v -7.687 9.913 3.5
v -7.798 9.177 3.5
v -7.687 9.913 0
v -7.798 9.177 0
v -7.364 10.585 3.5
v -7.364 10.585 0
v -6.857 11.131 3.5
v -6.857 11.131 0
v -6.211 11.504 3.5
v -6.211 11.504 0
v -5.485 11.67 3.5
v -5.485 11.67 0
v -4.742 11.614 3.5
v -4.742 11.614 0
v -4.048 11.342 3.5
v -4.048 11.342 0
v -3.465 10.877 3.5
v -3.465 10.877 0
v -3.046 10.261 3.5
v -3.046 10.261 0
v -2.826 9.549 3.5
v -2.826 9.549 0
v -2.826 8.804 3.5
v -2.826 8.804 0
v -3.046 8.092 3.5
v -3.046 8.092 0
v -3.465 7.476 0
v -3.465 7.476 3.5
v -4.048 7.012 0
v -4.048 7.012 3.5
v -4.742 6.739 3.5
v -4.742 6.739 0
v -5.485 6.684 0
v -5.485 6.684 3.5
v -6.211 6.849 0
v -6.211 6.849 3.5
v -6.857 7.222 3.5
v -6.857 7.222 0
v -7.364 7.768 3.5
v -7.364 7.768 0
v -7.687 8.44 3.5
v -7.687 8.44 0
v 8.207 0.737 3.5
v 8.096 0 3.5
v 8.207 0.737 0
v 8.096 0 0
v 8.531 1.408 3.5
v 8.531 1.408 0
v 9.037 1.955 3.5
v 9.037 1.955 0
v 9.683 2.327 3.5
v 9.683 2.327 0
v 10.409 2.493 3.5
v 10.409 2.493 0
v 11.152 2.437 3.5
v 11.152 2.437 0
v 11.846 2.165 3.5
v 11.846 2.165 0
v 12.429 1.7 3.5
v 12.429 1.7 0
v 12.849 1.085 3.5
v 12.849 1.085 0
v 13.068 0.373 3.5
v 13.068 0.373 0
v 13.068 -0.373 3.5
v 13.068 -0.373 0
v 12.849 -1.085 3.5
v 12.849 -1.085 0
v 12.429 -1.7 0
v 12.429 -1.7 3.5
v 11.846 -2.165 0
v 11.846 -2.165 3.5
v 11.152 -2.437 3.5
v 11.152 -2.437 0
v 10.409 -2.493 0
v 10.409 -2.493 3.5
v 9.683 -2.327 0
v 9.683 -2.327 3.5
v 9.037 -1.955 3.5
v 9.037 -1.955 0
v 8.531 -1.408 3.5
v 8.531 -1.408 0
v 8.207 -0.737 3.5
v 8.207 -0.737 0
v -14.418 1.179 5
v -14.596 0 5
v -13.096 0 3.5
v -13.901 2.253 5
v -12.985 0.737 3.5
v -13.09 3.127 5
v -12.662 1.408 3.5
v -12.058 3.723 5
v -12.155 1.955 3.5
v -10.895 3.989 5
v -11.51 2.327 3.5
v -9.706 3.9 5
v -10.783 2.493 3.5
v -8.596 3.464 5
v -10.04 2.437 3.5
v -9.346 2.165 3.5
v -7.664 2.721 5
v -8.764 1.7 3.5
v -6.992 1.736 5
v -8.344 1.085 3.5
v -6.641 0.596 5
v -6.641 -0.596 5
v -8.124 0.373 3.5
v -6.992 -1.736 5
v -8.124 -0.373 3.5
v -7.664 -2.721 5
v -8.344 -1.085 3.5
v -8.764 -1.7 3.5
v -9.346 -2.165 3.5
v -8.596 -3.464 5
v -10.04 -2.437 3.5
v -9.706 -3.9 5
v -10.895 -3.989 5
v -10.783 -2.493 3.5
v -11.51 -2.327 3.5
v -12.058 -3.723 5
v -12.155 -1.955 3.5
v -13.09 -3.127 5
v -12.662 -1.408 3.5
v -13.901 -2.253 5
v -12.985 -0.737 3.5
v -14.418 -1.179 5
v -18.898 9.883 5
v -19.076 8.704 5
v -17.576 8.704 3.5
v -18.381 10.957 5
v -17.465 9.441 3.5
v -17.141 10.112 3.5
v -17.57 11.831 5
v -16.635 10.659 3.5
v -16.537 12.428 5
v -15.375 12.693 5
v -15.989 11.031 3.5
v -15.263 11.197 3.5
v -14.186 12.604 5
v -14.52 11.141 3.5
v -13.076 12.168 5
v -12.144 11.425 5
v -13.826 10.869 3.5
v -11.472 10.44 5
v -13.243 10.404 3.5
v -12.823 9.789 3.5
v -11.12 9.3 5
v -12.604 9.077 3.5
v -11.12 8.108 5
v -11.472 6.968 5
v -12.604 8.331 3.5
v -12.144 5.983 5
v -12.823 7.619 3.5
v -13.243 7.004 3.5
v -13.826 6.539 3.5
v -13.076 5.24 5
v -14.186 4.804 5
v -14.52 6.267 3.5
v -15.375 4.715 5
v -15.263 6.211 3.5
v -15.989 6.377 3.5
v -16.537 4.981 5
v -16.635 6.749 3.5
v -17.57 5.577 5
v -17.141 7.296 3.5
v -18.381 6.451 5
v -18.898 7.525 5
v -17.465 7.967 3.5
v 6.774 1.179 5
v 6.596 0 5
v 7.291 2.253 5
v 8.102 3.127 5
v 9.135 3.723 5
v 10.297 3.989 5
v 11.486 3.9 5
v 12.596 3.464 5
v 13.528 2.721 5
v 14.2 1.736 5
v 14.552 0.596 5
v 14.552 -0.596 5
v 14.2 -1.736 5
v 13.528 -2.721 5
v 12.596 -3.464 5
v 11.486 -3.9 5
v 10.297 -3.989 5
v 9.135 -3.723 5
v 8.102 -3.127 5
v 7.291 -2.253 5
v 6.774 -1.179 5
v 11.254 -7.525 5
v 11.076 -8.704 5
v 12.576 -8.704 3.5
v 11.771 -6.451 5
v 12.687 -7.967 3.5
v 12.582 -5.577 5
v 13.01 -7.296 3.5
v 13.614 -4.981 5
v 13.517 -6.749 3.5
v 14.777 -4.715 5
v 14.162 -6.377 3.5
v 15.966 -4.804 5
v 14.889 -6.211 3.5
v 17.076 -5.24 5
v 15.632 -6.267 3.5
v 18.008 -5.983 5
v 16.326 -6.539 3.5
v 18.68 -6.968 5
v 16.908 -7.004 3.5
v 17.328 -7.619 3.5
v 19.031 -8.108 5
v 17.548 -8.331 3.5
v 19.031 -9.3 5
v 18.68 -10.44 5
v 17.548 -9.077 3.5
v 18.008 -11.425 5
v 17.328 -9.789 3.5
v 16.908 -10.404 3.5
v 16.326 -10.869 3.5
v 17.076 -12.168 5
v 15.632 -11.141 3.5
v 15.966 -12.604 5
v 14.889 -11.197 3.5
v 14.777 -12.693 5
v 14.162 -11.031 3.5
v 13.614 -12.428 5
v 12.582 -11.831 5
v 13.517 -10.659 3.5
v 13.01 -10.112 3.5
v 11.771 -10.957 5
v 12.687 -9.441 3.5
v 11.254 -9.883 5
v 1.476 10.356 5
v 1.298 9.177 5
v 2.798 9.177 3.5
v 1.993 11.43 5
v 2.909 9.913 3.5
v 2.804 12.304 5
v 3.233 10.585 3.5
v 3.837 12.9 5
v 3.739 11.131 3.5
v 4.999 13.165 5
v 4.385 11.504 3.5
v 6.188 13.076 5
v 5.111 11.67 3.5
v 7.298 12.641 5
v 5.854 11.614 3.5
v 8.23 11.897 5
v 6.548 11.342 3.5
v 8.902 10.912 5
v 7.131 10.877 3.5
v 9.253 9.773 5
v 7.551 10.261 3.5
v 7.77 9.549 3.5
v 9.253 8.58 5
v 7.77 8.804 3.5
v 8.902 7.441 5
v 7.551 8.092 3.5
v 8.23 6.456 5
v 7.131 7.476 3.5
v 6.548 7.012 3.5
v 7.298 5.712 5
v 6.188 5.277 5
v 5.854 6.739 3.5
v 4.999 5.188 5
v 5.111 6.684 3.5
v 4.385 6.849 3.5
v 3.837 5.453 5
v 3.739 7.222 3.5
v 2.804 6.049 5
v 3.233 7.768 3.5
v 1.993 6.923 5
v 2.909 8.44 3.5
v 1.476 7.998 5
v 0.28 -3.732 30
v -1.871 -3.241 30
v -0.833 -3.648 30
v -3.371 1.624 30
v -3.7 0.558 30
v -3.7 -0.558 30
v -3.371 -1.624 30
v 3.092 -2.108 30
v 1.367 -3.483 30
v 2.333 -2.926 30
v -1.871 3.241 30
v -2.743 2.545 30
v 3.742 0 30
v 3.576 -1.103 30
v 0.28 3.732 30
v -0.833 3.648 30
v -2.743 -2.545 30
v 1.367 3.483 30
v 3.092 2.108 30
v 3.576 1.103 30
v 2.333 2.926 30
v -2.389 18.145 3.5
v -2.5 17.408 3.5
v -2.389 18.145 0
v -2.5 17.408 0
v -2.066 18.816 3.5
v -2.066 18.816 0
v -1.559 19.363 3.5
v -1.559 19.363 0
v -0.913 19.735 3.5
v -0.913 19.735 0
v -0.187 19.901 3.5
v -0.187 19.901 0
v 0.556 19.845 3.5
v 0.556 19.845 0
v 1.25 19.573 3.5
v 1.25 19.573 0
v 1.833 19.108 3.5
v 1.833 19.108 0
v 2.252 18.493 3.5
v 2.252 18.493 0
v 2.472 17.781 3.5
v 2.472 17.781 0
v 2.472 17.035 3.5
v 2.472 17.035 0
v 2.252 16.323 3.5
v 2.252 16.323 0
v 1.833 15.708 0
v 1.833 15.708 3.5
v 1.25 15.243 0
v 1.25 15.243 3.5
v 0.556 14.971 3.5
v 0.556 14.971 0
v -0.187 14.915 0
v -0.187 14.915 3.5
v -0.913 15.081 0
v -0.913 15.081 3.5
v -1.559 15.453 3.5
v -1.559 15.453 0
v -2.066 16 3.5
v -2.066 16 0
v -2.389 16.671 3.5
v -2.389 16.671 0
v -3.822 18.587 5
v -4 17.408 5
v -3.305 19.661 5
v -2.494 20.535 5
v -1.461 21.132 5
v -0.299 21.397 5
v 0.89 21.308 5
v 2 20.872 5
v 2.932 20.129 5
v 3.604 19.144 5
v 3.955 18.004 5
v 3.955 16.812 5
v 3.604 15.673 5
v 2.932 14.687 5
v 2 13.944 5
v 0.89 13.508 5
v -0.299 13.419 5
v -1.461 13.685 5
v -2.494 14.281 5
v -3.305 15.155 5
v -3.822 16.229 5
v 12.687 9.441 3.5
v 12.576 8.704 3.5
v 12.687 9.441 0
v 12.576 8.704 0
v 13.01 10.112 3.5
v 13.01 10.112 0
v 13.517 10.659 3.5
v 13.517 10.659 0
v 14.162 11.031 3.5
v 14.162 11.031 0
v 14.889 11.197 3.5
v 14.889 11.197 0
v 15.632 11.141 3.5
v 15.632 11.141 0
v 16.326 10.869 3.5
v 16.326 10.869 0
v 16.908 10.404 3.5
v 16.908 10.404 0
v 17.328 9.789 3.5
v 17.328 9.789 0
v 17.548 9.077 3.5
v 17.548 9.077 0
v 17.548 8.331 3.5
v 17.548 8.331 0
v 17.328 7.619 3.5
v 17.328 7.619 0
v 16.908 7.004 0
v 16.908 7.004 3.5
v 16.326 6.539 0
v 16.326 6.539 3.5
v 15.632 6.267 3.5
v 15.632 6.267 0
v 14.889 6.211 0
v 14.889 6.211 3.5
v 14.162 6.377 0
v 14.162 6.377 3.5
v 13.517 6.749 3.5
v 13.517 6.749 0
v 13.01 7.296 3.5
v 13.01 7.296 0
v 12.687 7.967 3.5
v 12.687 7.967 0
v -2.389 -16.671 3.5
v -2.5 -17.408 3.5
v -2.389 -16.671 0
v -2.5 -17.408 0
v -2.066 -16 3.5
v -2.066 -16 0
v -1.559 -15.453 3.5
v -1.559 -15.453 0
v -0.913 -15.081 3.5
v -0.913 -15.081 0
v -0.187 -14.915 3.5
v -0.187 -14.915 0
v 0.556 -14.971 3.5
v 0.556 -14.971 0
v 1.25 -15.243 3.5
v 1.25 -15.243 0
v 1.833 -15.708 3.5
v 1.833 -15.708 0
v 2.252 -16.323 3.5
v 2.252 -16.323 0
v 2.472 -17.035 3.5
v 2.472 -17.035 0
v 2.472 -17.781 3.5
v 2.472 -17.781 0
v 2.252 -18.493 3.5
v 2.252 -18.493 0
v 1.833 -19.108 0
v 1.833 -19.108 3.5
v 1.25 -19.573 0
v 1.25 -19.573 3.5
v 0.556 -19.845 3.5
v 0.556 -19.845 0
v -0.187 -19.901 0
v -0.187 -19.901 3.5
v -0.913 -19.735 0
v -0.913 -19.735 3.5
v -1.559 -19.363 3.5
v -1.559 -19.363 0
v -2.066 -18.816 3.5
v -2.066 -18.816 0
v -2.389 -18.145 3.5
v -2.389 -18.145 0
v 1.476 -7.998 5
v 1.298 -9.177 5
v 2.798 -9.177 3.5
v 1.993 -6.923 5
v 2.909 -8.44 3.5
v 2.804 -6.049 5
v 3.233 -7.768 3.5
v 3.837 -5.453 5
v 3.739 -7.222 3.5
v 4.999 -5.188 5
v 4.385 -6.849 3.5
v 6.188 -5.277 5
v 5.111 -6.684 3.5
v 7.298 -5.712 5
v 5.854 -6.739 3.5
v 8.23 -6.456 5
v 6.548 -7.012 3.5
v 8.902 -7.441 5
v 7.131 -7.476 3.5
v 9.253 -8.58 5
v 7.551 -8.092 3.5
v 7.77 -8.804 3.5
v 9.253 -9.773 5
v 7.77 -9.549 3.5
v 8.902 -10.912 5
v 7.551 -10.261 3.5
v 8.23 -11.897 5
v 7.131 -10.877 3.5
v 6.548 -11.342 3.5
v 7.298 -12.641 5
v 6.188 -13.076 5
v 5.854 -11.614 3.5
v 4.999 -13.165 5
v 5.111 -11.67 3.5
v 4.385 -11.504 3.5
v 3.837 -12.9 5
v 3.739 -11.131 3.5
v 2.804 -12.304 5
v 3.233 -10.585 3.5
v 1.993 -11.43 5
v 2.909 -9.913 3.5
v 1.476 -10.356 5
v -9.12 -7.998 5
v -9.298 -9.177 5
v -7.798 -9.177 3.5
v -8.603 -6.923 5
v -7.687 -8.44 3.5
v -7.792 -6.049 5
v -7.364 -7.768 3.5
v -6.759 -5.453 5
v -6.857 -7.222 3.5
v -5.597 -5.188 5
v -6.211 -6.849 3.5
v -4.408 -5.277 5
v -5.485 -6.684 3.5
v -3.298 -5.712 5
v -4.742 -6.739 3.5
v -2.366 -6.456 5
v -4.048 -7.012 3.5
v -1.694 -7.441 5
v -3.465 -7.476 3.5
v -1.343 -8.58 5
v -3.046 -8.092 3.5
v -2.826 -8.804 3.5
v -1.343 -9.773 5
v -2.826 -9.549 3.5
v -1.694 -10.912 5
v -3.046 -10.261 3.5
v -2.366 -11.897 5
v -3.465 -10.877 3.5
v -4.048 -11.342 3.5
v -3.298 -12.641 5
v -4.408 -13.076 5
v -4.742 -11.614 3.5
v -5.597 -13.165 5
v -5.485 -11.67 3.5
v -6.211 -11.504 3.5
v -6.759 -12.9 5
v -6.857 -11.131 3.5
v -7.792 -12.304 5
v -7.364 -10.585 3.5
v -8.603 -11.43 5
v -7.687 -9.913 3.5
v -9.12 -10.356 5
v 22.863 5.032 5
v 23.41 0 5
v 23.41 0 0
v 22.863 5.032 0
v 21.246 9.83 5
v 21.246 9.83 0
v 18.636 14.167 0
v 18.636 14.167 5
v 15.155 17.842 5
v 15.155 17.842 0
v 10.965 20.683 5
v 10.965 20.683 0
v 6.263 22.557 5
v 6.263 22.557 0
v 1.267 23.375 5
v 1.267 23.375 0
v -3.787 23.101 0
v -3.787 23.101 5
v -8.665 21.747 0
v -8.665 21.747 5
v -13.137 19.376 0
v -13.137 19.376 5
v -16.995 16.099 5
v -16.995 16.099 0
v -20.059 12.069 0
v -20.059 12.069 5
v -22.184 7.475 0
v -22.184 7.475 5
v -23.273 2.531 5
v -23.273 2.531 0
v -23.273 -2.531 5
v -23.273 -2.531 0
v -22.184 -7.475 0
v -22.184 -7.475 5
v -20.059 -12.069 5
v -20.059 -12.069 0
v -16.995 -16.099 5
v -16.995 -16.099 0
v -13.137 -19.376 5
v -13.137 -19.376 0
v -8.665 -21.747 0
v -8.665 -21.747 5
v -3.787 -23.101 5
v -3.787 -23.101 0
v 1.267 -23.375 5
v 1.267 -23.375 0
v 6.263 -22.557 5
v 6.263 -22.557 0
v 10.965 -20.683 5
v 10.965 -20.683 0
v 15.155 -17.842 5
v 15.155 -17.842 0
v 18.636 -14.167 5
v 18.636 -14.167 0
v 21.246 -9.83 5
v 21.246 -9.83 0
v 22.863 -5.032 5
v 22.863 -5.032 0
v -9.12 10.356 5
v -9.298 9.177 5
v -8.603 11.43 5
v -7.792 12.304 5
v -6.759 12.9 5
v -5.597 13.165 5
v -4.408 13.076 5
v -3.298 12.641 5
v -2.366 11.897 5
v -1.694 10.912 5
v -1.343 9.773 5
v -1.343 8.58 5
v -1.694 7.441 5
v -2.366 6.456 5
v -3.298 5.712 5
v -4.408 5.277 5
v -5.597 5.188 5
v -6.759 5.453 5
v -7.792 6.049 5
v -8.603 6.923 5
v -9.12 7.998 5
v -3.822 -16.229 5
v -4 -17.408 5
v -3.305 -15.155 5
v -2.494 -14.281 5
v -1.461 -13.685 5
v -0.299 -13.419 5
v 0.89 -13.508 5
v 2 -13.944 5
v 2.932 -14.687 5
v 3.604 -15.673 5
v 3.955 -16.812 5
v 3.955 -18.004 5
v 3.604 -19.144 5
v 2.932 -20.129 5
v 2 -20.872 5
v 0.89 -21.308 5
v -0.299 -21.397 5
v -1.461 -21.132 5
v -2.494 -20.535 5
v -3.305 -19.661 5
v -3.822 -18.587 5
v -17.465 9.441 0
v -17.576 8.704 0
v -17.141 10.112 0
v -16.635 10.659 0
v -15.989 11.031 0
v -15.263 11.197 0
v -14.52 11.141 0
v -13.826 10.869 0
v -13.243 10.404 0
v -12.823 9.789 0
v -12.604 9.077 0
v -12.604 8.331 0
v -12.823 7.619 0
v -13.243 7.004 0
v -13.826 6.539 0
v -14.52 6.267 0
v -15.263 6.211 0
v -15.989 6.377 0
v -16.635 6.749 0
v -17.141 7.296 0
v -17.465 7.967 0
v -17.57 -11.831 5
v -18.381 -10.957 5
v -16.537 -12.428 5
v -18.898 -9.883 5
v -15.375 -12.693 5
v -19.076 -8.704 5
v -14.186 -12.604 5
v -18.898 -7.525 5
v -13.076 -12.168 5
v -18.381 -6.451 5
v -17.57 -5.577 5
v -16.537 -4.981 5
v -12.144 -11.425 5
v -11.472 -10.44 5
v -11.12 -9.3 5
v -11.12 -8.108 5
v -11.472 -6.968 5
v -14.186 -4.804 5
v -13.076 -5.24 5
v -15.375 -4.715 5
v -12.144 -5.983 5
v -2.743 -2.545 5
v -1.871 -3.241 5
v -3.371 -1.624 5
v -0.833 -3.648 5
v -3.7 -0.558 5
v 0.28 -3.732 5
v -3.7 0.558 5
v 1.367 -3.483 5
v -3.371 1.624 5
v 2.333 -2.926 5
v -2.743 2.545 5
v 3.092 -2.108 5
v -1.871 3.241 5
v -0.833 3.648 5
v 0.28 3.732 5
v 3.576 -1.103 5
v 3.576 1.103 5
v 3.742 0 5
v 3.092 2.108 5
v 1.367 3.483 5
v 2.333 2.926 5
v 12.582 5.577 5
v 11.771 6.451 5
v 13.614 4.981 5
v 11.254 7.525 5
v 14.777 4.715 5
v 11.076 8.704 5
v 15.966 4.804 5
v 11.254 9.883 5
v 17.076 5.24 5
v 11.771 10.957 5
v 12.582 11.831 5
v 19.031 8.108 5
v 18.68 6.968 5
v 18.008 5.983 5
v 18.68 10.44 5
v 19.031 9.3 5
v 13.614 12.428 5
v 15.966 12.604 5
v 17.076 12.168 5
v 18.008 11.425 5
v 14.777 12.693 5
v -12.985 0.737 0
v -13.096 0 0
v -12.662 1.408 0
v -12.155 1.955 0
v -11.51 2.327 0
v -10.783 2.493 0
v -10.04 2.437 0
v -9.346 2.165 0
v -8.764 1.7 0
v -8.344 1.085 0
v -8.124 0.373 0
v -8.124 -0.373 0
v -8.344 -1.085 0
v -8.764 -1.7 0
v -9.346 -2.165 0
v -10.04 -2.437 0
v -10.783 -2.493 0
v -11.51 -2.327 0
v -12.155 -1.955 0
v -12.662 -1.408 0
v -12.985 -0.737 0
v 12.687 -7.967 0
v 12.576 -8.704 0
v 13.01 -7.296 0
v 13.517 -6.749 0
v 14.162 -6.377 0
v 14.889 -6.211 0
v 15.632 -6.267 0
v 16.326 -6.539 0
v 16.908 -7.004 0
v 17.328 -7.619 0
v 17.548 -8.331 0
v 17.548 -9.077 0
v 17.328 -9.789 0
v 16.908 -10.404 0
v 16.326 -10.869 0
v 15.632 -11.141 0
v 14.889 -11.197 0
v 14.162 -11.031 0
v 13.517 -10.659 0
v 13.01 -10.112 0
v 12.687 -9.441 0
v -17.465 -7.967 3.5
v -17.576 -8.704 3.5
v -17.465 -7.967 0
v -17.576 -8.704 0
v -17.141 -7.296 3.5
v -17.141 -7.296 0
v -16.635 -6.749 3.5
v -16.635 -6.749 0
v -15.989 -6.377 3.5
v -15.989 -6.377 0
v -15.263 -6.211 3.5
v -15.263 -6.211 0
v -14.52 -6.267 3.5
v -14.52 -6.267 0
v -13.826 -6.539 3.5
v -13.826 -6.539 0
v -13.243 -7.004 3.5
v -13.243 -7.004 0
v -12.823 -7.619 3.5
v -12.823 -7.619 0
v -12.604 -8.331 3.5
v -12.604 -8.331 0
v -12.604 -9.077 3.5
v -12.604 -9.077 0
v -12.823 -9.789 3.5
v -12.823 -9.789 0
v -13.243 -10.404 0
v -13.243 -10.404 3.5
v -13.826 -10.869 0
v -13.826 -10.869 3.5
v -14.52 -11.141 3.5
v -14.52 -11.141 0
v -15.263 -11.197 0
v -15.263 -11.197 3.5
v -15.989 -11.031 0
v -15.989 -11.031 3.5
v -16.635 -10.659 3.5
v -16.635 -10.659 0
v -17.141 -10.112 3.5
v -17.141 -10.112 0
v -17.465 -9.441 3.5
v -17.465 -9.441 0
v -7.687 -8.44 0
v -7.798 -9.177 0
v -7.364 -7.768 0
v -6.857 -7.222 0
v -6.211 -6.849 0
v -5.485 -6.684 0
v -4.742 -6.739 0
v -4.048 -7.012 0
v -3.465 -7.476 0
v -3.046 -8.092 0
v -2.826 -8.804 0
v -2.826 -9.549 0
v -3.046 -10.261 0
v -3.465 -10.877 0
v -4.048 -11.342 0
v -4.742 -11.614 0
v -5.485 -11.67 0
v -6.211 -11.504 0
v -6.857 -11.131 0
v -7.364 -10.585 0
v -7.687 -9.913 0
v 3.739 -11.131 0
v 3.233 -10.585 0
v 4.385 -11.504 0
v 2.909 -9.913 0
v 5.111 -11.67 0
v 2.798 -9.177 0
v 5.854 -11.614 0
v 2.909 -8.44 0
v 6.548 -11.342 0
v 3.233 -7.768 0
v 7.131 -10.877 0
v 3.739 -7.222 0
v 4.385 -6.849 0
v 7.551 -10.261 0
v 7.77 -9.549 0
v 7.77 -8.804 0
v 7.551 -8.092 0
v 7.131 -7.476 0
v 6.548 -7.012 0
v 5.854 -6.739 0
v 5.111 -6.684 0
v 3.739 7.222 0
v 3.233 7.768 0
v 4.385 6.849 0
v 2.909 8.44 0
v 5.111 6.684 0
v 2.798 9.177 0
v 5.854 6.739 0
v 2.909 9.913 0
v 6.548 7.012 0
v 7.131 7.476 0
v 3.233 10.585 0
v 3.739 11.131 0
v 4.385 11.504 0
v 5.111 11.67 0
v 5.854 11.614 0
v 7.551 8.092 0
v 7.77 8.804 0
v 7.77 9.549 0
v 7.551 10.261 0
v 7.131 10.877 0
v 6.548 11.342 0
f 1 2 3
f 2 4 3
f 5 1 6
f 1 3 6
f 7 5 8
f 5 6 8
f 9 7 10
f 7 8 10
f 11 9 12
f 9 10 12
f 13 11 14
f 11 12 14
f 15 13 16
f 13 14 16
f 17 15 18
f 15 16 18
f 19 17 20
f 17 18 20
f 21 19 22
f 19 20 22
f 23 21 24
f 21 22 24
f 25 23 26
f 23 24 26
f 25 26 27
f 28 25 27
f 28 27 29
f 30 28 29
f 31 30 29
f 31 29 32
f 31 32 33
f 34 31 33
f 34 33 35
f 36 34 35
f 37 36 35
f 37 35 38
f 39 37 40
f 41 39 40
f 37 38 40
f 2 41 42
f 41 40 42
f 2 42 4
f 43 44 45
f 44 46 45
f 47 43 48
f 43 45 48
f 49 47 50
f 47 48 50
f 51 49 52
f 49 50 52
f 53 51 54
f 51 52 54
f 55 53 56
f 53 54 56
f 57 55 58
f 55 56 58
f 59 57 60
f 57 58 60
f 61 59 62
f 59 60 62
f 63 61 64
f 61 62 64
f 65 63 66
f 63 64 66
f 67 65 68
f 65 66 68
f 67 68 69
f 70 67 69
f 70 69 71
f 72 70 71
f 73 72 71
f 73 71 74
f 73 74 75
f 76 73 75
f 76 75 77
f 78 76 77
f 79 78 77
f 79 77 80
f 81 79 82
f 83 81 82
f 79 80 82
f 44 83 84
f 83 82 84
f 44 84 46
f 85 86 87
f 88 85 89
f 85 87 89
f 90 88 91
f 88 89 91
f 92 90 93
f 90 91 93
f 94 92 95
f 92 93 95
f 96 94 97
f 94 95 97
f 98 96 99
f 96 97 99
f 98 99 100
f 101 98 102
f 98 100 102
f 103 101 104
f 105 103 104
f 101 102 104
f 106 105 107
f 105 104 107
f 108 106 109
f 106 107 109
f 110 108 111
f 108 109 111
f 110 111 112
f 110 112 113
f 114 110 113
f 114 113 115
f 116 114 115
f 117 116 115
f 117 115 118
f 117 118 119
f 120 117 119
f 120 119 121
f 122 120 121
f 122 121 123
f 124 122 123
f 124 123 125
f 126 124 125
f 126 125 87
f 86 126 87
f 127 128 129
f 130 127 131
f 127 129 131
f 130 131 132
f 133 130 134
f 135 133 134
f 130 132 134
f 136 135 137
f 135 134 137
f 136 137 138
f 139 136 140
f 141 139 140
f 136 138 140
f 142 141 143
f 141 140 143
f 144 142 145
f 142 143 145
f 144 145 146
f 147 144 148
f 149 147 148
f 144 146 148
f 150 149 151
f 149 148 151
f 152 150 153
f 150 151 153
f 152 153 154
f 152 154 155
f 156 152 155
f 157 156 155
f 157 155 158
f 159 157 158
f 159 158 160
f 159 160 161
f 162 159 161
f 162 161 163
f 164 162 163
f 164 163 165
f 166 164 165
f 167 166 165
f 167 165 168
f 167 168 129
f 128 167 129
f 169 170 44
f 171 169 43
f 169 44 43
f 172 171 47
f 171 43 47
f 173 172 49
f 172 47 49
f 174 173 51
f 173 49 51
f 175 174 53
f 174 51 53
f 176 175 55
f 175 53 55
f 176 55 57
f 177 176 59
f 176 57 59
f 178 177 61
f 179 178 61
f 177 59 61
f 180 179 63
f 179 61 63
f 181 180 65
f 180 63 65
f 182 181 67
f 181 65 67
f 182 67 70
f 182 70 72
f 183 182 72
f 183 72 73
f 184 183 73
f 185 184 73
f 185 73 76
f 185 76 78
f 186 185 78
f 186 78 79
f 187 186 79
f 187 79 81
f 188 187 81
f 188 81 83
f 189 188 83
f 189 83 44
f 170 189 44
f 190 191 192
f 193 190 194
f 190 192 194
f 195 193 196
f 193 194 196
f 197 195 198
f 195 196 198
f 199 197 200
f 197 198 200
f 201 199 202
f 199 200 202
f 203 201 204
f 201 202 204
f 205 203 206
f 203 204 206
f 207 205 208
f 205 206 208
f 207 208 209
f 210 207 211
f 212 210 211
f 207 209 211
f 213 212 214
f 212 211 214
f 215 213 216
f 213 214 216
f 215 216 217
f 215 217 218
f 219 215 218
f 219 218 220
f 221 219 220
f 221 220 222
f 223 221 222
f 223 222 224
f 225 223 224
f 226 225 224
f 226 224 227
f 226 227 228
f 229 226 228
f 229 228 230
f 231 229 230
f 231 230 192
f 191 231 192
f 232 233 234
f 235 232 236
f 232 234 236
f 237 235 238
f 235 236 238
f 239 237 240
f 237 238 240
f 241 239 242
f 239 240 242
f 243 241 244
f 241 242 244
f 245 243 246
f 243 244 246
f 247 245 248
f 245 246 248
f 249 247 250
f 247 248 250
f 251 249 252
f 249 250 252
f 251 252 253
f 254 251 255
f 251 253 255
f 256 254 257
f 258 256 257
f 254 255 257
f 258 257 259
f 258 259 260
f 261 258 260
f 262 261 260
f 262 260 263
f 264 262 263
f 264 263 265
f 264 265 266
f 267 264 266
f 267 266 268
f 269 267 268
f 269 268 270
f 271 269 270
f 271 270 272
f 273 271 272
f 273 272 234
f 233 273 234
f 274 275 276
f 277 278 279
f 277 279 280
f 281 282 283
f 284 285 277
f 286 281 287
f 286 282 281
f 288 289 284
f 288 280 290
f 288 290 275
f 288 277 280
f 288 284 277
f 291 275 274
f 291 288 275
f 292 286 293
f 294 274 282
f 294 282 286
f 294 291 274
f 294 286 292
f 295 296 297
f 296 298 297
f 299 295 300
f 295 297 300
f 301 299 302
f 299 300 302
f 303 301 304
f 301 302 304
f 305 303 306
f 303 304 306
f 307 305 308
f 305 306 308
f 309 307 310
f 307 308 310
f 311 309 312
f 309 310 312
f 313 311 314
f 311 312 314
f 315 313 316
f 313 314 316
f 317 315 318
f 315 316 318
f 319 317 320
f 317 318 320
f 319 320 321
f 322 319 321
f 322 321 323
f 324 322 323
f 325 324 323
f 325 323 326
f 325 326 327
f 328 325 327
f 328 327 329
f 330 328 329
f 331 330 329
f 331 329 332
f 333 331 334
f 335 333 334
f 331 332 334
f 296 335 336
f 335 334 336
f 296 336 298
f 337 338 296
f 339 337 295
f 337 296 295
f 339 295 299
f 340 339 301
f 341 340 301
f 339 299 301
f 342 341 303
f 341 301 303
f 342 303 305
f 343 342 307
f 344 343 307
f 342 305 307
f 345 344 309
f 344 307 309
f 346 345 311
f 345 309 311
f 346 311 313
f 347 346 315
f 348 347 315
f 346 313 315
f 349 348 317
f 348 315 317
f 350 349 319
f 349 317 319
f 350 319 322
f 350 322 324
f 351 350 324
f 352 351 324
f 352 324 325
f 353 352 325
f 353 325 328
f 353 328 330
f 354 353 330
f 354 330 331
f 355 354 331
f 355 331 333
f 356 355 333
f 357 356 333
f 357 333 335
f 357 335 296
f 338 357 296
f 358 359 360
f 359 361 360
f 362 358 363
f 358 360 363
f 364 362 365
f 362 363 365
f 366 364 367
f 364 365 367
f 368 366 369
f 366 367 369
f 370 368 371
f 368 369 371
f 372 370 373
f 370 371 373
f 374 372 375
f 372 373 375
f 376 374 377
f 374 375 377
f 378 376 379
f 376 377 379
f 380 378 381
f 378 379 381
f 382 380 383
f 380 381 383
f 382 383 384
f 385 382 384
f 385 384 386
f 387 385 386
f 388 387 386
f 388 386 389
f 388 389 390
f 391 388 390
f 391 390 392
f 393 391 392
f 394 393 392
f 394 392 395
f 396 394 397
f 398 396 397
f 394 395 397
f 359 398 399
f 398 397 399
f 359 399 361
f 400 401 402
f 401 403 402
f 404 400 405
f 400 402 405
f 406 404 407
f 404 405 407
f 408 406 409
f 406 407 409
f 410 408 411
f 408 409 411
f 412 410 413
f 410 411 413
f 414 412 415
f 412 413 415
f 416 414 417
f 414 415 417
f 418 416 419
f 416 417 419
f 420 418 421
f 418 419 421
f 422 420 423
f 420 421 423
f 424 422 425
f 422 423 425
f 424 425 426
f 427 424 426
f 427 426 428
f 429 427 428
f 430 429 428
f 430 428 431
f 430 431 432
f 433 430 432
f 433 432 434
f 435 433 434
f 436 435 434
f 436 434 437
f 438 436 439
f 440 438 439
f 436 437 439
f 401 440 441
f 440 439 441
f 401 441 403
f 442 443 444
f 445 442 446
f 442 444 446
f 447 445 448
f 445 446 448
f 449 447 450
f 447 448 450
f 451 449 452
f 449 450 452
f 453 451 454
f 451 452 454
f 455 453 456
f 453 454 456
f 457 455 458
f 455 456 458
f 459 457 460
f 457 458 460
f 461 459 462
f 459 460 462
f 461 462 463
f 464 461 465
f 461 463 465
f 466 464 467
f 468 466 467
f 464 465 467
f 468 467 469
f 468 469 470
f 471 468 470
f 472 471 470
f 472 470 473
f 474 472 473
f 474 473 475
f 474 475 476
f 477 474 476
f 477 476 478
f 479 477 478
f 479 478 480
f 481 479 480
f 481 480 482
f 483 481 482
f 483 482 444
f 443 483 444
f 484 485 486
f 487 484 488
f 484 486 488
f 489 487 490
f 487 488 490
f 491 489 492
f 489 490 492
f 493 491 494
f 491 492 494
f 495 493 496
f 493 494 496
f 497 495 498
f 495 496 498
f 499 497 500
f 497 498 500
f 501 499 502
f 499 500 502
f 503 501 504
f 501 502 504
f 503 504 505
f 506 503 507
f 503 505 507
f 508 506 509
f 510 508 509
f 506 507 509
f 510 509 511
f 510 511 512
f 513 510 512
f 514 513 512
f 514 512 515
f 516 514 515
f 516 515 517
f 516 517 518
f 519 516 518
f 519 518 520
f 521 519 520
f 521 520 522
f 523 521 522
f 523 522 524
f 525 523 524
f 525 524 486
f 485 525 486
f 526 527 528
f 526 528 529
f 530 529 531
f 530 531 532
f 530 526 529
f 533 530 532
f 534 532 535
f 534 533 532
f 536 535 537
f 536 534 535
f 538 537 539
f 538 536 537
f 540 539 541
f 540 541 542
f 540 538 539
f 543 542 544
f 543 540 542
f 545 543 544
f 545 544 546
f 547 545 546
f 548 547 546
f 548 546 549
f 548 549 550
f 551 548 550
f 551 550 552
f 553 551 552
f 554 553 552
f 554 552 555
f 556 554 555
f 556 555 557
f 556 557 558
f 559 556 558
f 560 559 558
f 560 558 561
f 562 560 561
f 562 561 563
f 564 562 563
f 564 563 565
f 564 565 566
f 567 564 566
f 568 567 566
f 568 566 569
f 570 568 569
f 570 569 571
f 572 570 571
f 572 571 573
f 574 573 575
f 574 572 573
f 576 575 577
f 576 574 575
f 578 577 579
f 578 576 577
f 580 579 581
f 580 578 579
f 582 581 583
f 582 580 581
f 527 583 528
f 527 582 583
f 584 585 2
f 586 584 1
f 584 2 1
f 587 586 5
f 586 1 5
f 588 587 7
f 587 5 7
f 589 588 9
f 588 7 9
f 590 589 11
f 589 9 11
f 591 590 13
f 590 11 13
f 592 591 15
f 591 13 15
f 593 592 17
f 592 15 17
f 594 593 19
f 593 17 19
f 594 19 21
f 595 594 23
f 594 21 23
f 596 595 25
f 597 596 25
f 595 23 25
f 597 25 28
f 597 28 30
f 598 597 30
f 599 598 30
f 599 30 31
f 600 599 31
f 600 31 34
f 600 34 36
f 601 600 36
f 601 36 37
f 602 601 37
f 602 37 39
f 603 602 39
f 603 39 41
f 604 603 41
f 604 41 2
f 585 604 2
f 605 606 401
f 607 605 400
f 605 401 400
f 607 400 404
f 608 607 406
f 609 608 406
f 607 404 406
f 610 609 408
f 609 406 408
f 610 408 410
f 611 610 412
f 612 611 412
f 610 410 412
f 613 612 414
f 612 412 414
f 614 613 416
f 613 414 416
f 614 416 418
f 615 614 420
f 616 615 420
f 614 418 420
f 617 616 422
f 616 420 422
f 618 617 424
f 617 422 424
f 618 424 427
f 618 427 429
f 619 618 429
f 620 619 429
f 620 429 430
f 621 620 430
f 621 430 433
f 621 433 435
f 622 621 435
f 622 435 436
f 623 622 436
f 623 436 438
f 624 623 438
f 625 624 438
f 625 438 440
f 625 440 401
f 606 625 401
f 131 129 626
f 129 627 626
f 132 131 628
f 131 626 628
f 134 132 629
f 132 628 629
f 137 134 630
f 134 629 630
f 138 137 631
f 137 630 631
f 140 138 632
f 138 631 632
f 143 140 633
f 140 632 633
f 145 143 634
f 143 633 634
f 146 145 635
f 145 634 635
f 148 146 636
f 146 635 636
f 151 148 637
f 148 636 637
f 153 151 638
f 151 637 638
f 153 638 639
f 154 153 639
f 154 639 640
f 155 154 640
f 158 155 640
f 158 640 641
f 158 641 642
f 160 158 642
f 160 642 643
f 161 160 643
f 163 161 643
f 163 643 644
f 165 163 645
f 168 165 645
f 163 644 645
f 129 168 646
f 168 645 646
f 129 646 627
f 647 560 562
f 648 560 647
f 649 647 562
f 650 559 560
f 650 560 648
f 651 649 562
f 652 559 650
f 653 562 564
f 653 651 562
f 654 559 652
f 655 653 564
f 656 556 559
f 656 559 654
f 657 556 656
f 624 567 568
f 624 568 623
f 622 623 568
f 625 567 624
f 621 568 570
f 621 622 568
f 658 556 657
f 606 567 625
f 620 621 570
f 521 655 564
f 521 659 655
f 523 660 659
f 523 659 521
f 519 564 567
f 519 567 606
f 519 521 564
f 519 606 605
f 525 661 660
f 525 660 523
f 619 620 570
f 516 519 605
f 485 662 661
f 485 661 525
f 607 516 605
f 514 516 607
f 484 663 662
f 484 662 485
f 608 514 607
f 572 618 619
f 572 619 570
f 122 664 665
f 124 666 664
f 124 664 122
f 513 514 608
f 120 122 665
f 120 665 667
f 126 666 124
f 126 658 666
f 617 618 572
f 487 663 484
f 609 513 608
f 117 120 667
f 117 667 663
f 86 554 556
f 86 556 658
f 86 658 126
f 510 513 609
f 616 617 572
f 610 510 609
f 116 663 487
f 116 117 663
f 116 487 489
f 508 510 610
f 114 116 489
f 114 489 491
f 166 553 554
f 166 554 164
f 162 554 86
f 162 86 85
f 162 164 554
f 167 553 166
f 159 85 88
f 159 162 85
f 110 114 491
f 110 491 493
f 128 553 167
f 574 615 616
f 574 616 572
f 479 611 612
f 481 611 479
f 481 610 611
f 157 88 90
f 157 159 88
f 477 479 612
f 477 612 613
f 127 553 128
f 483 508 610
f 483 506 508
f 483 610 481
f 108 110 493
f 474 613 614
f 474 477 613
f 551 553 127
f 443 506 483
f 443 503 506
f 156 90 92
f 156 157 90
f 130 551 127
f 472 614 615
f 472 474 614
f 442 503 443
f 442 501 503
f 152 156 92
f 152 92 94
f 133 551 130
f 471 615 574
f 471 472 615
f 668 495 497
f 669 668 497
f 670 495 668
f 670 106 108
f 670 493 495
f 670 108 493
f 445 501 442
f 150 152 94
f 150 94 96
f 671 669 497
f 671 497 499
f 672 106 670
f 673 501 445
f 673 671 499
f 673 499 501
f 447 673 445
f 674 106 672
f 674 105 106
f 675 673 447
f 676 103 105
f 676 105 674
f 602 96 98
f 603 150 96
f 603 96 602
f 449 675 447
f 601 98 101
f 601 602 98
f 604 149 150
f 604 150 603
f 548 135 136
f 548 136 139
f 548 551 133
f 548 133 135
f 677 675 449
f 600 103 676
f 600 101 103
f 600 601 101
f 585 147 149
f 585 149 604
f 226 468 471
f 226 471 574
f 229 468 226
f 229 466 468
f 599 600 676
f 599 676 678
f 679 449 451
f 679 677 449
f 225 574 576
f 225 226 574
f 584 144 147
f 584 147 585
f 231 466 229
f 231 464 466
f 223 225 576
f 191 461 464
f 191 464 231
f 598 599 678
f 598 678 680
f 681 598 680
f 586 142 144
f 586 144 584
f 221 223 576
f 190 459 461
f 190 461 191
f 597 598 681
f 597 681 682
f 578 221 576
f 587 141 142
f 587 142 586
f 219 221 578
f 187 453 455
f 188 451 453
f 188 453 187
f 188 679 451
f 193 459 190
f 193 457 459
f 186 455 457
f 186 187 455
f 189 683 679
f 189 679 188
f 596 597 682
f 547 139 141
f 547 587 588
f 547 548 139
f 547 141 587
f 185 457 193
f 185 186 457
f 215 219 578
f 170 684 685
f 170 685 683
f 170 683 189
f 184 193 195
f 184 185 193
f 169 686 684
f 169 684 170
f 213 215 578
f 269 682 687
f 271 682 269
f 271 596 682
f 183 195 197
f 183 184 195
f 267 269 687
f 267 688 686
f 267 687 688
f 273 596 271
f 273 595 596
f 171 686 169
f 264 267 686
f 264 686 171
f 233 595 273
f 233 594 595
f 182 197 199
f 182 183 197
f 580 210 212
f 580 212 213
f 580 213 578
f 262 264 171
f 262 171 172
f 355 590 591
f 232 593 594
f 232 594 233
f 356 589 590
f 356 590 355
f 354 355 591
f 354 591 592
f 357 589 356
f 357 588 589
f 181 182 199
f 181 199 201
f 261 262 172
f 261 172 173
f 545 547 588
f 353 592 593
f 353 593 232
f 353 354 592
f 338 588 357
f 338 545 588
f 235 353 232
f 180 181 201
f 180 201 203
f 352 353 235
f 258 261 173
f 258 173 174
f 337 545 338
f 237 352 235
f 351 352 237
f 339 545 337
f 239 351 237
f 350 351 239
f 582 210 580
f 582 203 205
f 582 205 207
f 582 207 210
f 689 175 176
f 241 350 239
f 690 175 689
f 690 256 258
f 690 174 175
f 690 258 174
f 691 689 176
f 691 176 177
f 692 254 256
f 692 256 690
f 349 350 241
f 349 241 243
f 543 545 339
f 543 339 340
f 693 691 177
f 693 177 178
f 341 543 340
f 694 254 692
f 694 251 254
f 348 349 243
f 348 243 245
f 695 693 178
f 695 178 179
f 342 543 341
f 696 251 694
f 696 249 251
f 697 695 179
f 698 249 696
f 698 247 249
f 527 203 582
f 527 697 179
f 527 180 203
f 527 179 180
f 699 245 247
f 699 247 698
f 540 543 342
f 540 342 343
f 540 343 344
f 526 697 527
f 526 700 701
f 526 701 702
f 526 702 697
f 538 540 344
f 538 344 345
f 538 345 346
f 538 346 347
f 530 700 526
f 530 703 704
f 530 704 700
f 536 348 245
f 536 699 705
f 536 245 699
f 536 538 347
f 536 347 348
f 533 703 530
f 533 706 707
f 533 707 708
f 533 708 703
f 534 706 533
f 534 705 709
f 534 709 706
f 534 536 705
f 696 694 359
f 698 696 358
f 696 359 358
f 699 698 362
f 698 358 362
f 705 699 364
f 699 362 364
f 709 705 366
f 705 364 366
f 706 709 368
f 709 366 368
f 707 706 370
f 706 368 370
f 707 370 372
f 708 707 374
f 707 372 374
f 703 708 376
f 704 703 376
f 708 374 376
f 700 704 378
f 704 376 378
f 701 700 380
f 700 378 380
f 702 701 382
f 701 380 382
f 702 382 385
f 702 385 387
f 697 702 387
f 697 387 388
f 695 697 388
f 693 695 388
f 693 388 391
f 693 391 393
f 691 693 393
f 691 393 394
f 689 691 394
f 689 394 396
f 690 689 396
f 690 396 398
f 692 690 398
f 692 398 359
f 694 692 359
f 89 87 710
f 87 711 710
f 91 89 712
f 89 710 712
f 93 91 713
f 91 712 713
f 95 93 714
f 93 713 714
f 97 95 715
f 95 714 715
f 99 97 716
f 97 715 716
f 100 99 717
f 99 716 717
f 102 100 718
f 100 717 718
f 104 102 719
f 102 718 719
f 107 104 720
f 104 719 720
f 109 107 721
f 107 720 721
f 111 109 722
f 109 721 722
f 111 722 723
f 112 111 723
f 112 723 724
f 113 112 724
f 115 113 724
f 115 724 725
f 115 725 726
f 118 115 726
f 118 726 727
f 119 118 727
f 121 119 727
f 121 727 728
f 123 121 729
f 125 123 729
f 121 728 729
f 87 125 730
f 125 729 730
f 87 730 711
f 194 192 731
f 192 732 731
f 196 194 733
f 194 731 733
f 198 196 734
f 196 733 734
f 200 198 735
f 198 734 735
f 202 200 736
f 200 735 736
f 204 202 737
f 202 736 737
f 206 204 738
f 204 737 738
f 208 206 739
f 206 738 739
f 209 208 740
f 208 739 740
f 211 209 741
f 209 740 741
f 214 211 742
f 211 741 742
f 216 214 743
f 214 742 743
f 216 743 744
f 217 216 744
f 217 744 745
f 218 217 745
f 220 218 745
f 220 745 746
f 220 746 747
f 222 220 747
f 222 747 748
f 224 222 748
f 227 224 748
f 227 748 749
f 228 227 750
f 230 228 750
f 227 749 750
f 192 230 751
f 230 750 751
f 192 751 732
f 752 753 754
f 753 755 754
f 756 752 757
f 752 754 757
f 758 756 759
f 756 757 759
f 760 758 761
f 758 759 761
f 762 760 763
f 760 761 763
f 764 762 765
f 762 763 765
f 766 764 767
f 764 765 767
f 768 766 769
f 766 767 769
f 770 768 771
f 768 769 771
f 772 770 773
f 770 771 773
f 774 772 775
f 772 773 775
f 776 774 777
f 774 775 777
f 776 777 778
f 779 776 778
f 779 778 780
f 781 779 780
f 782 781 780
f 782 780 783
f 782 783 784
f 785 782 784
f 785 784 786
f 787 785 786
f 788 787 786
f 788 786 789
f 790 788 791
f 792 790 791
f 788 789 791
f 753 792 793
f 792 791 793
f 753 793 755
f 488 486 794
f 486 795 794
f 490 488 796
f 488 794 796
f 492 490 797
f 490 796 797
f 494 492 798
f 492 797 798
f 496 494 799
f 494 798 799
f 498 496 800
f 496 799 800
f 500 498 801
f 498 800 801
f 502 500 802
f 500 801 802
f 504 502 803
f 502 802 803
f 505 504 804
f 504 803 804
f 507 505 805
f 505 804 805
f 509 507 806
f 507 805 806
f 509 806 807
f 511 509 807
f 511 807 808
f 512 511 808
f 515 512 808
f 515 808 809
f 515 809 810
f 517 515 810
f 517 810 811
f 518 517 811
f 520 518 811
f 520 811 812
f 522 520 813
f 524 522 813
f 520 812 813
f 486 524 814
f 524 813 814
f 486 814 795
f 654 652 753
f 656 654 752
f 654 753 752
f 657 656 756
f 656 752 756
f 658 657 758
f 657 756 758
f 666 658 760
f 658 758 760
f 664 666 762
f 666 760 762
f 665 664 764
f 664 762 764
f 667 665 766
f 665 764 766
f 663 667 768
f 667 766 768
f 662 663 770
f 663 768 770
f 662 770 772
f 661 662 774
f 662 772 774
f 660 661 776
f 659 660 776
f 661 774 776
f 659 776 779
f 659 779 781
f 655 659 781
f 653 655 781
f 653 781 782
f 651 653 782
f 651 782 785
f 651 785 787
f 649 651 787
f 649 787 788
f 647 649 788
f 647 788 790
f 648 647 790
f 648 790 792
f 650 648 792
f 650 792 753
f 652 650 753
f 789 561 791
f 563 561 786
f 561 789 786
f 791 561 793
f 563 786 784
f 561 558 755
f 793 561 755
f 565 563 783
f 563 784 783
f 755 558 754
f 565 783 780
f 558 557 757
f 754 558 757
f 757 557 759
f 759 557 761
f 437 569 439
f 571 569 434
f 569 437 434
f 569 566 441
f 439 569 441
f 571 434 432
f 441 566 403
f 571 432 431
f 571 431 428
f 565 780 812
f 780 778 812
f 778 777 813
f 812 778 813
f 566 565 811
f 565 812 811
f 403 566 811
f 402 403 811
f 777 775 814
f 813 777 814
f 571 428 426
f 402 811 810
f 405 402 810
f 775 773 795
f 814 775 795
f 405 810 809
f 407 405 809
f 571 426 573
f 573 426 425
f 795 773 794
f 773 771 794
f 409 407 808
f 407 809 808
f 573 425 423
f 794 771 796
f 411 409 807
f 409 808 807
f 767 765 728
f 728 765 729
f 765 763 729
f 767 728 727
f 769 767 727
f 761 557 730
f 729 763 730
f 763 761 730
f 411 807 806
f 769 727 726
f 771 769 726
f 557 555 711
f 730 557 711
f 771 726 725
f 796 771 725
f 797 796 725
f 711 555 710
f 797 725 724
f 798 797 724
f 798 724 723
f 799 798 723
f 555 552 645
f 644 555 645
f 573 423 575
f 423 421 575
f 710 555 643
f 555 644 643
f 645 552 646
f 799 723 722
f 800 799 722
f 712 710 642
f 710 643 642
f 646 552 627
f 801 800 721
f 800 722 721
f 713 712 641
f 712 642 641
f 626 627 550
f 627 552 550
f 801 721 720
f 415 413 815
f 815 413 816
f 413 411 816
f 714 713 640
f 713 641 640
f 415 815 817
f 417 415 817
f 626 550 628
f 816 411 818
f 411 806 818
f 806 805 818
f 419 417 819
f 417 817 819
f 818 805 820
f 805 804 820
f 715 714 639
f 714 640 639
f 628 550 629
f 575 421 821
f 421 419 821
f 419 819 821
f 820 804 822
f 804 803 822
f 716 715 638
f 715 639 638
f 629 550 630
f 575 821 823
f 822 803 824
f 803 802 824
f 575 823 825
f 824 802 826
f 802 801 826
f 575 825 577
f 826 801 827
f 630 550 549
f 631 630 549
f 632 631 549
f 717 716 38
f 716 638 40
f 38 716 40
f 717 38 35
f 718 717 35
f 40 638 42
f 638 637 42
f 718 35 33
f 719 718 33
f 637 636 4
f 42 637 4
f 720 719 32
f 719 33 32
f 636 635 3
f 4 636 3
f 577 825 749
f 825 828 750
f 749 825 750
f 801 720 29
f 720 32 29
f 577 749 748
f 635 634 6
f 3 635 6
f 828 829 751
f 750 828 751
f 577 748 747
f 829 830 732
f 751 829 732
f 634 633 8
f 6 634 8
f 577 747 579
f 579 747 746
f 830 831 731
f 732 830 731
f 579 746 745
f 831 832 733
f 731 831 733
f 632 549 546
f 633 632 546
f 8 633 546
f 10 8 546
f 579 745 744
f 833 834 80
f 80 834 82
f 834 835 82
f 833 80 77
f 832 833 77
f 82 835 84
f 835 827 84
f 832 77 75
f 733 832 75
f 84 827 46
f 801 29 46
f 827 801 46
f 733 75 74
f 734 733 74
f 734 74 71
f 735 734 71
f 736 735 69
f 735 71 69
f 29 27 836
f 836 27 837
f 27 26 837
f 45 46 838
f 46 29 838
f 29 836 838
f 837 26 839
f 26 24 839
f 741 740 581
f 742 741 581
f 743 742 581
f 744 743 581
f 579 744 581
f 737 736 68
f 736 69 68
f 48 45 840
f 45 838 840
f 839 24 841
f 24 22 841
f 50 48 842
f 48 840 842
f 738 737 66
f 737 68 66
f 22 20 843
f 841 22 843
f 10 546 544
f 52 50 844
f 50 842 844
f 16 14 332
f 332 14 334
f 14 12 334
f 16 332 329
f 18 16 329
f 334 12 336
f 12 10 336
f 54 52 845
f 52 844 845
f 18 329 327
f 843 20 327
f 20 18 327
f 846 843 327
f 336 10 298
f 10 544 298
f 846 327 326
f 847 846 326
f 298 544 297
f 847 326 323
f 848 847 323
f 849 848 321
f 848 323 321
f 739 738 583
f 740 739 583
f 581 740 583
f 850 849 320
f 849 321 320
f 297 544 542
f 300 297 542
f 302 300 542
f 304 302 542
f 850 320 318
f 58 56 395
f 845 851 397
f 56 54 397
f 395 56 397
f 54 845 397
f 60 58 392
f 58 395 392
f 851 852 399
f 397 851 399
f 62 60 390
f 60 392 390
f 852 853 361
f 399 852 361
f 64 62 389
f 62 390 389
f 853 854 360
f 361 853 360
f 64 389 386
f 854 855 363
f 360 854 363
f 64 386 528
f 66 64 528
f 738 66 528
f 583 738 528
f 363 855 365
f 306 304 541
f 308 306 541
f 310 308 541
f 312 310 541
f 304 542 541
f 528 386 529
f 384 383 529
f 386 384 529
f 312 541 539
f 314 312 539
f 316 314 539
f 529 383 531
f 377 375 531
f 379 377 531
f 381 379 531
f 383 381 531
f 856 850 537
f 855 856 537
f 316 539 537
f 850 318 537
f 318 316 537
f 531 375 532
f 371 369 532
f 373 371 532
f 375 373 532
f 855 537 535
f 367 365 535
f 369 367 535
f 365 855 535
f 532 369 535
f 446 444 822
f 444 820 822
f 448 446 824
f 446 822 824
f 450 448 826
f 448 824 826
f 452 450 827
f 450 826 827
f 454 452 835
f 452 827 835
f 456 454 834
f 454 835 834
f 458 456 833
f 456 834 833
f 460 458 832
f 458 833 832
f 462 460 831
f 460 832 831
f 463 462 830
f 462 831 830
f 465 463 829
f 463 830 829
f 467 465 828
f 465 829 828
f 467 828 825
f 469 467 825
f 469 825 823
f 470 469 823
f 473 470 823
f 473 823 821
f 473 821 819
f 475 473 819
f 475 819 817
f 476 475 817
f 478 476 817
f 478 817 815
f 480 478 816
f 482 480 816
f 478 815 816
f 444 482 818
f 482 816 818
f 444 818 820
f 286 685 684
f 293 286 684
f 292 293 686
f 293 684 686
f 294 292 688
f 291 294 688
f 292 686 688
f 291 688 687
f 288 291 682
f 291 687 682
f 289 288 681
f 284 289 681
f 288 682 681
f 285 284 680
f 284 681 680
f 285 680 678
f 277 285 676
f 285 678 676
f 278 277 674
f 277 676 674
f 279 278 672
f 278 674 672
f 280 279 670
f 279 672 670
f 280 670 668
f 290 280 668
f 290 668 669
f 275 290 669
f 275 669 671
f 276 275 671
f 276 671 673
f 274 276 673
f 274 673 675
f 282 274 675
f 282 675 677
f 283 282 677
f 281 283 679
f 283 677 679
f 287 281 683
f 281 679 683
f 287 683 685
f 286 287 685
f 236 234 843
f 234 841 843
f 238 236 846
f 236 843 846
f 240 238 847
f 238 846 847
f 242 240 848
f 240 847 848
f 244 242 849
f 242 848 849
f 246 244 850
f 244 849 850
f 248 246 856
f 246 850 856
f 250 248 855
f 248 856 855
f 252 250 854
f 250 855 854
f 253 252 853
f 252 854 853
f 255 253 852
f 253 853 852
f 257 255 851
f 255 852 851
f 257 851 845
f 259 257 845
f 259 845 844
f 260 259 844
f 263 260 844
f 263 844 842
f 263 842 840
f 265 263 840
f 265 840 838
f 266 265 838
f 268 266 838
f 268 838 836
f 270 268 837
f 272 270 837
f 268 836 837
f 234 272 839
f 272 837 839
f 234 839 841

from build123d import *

# Parameters (mm, degrees)
F0_W           = 50
F0_H           = 50
F1_DEPTH       = 5
F3_D           = 5
F3_CSINK_D     = 8
F3_CSINK_ANGLE = 90
F4_R           = 23.40982
F5_DEPTH       = 25
F7_D           = 5
F7_CSINK_D     = 8
F7_CSINK_ANGLE = 90
F8_R           = 3.742028
F9_DEPTH       = 25


with BuildPart() as f1:
    # F0 (on Top) → F1 (new body)
    with BuildSketch(Plane.XY):
        Rectangle(F0_W, F0_H)
    extrude(amount=F1_DEPTH)

    # F3 (through all)
    with Locations(Plane.XY.offset(5)):
        with Locations((0, 17.408038), (15.075803, 8.704019), (15.075803, -8.704019), (0, -17.408038), (-15.075803, -8.704019), (-15.075803, 8.704019)):
            CounterSinkHole(F3_D / 2, F3_CSINK_D / 2, counter_sink_angle=F3_CSINK_ANGLE)

    # F4 (on face) → F5 (intersect)
    with BuildSketch(Plane.XY.offset(5)):
        Circle(F4_R)
    extrude(amount=-F5_DEPTH, mode=Mode.INTERSECT)

    # F7 (through all)
    with Locations(Plane.XY.offset(5)):
        with Locations((-5.298098, 9.176576), (5.298098, 9.176576), (10.596197, 0), (5.298098, -9.176576), (-5.298098, -9.176576), (-10.596197, 0)):
            CounterSinkHole(F7_D / 2, F7_CSINK_D / 2, counter_sink_angle=F7_CSINK_ANGLE)

    # F8 (on face) → F9 (join)
    with BuildSketch(Plane.XY.offset(5)):
        Circle(F8_R)
    extrude(amount=F9_DEPTH)


solid = f1.part
